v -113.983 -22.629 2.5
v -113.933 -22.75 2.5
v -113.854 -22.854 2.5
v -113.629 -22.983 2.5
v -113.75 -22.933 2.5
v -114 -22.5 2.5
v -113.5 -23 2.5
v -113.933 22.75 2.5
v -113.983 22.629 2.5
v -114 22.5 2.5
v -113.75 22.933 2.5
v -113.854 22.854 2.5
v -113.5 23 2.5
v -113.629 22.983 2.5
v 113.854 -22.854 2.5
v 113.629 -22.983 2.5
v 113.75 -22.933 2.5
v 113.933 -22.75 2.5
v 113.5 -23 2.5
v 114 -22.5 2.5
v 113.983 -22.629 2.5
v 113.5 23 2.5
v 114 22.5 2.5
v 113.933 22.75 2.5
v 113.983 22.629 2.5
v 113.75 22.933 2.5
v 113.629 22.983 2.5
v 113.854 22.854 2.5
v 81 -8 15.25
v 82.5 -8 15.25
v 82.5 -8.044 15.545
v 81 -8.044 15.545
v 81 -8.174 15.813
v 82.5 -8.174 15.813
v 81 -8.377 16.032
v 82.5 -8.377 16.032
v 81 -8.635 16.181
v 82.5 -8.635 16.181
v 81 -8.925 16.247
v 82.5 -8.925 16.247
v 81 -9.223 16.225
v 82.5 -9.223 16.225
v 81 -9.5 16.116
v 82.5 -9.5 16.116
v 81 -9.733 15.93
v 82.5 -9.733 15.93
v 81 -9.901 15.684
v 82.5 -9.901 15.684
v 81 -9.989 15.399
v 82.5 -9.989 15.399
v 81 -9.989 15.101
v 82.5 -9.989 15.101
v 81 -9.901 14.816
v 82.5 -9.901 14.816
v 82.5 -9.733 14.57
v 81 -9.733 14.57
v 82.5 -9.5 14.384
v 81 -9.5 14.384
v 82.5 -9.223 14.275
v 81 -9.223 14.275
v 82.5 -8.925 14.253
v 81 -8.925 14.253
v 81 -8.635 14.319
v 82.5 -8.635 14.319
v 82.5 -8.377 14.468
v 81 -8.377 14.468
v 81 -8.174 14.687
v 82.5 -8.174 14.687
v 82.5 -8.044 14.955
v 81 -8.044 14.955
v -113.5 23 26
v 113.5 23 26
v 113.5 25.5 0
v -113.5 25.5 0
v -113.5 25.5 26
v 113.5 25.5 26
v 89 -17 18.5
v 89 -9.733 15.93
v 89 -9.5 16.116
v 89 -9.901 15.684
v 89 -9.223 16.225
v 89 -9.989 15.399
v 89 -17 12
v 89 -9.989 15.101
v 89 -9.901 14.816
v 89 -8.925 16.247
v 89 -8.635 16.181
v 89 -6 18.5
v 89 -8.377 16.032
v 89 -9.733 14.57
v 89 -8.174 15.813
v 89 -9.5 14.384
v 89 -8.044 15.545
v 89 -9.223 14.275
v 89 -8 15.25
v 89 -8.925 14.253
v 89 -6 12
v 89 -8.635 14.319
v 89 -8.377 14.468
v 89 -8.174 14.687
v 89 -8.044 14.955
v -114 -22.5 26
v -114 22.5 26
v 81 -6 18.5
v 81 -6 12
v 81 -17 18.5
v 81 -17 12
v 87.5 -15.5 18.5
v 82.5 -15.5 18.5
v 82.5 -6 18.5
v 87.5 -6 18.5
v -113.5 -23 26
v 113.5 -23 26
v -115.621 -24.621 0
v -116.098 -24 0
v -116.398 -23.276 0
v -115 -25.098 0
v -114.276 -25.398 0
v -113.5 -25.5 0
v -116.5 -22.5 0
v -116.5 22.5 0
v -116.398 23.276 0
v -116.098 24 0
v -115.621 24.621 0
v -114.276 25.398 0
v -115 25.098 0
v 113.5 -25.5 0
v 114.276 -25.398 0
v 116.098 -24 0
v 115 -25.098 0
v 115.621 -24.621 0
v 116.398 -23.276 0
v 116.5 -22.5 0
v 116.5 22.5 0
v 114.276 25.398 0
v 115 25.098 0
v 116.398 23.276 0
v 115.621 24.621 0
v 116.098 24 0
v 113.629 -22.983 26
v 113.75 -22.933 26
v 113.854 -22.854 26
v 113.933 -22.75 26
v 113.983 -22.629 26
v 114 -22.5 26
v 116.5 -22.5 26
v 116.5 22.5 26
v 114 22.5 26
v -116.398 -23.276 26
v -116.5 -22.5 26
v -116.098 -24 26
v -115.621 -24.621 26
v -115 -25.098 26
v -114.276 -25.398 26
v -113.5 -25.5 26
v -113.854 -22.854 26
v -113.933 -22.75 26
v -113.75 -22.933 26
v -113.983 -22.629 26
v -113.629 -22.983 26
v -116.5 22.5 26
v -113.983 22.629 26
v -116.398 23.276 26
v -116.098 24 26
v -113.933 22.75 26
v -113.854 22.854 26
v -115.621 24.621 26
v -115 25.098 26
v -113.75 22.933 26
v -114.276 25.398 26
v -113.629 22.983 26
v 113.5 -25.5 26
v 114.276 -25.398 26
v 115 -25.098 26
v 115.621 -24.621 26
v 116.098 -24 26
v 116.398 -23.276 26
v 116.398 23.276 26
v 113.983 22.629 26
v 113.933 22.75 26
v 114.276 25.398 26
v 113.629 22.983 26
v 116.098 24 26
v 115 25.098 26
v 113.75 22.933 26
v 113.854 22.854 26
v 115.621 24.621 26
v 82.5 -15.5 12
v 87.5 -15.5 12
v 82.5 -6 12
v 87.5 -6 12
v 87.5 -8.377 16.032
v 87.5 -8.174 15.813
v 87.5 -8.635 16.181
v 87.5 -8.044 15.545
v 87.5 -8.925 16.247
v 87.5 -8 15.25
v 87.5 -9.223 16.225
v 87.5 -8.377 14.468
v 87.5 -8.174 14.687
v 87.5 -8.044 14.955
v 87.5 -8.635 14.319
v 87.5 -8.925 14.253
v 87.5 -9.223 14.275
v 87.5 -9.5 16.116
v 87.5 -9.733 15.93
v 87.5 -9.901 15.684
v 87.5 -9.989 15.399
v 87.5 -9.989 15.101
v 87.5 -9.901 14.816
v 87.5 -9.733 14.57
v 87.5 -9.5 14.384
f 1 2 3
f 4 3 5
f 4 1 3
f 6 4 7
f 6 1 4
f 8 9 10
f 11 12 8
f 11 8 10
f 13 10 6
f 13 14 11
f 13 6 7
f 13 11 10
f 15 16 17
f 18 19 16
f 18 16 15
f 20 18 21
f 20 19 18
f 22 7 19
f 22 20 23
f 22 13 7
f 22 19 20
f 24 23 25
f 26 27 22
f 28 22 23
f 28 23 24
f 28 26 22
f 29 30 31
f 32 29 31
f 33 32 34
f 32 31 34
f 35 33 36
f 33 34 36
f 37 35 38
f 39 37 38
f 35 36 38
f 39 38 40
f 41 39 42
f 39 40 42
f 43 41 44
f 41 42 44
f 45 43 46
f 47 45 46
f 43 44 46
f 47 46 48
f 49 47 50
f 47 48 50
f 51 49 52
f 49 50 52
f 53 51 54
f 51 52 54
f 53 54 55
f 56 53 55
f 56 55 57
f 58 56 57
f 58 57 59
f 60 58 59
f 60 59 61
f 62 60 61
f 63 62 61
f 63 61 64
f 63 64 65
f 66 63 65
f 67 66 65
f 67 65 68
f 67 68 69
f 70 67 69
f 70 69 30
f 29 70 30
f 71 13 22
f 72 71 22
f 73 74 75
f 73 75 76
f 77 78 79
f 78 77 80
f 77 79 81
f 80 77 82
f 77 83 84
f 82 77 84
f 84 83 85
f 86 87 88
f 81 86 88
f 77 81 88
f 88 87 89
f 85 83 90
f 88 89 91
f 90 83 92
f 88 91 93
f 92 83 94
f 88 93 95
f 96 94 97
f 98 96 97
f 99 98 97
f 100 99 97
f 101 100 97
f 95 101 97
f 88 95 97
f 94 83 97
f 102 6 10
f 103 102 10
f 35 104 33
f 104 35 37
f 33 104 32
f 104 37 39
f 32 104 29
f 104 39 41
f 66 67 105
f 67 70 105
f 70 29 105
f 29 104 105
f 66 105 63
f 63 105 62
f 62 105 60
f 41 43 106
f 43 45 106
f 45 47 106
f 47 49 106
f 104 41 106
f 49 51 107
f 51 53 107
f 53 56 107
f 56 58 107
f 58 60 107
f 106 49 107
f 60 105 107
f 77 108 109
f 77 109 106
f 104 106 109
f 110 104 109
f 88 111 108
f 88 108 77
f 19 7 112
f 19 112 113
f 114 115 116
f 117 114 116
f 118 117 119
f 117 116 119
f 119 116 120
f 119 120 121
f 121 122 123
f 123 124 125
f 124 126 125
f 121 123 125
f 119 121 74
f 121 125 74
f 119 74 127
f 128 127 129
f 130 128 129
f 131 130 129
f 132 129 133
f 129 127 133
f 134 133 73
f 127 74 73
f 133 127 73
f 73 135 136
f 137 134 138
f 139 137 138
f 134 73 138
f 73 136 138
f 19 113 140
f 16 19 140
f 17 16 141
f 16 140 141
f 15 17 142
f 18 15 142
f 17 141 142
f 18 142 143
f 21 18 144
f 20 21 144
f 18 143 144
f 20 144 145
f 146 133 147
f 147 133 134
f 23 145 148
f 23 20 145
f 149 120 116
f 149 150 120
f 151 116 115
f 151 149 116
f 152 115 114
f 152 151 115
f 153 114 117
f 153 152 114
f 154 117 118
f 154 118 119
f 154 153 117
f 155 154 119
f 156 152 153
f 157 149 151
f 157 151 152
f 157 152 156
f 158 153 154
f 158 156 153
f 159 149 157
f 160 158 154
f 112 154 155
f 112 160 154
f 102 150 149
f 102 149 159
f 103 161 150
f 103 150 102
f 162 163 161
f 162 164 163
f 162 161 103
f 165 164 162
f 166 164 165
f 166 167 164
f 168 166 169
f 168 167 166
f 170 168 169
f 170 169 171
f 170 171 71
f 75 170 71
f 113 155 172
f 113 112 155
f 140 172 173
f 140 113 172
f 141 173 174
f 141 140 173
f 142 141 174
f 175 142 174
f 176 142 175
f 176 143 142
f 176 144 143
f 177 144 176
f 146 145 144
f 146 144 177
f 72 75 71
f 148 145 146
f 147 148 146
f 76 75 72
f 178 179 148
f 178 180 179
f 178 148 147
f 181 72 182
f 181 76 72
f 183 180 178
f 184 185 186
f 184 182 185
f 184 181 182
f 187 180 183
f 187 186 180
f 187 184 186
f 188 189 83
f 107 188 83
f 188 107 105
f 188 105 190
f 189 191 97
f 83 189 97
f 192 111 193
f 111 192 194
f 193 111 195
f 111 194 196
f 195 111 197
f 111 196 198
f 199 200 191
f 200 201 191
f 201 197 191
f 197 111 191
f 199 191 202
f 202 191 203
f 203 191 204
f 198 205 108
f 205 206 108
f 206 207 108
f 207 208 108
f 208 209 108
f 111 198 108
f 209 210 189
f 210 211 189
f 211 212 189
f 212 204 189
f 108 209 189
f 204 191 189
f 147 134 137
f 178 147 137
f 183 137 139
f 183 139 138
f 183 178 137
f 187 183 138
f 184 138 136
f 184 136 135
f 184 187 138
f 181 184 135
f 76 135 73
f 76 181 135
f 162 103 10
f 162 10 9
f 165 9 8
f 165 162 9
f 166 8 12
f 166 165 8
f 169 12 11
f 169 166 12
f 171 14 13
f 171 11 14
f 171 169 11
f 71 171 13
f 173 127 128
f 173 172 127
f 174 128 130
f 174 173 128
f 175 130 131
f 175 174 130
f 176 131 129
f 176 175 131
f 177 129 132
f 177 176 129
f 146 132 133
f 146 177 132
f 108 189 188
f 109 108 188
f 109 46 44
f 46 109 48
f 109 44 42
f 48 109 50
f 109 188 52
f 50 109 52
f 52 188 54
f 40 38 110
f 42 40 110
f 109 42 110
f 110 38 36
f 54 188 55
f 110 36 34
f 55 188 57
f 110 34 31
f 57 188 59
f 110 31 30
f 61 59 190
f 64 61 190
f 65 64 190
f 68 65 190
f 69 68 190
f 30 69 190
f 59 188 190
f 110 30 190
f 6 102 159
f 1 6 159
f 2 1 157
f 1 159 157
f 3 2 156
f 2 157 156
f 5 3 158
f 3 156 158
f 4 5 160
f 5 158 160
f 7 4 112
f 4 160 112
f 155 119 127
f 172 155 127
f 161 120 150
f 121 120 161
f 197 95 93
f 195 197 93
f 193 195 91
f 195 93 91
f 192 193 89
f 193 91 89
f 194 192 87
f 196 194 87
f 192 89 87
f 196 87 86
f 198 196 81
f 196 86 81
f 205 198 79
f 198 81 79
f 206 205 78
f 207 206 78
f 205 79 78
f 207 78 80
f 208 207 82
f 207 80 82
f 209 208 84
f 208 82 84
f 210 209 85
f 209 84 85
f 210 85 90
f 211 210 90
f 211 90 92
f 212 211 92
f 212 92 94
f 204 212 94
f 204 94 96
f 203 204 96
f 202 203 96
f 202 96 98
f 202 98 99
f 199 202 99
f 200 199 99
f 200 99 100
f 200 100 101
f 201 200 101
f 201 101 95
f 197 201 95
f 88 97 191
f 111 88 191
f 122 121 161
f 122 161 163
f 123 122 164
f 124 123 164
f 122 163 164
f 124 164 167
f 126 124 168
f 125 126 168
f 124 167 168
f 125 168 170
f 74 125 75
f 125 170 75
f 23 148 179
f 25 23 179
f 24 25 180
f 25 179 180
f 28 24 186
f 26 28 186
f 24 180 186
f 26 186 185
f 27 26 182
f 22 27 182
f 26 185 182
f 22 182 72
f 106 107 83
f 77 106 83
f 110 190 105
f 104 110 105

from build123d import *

# Parameters (mm, degrees)
F0_W     = 233
F0_H     = 51
F1_DEPTH = 26
F2_R     = 3
F3_T     = -2.5
F7_DEPTH = 6.5
F8_R     = 1
F9_DEPTH = 25


with BuildPart() as f1:
    # F0 (on Top) → F1 (new body)
    with BuildSketch(Plane.XY):
        Rectangle(F0_W, F0_H)
    extrude(amount=F1_DEPTH)

    # F2
    f2_edges = [f1.edges().sort_by_distance(p)[0] for p in [
        (-116.5, -25.5, 13),
        (116.5, -25.5, 13),
        (116.5, 25.5, 13),
        (-116.5, 25.5, 13),
    ]]
    fillet(f2_edges, radius=F2_R)

    # F3
    f3_openings = [f1.faces().sort_by_distance(p)[0] for p in [
        (0, 0, 26),
    ]]
    offset(amount=F3_T, openings=f3_openings)


with BuildPart() as f7:
    # F6 (on offset) → F7 (new body)
    with BuildSketch(Plane.XY.offset(12)):
        Polygon((87.5, -6), (87.5, -15.5), (82.5, -15.5), (82.5, -6), (81, -6), (81, -17), (89, -17), (89, -6), align=None)
    extrude(amount=F7_DEPTH)

    # F8 (on face) → F9 (cut)
    with BuildSketch(Plane.YZ.offset(89)):
        with Locations((-9, 15.25)):
            Circle(F8_R)
    extrude(amount=-F9_DEPTH, mode=Mode.SUBTRACT)


solid = Compound([f1.part, f7.part])
